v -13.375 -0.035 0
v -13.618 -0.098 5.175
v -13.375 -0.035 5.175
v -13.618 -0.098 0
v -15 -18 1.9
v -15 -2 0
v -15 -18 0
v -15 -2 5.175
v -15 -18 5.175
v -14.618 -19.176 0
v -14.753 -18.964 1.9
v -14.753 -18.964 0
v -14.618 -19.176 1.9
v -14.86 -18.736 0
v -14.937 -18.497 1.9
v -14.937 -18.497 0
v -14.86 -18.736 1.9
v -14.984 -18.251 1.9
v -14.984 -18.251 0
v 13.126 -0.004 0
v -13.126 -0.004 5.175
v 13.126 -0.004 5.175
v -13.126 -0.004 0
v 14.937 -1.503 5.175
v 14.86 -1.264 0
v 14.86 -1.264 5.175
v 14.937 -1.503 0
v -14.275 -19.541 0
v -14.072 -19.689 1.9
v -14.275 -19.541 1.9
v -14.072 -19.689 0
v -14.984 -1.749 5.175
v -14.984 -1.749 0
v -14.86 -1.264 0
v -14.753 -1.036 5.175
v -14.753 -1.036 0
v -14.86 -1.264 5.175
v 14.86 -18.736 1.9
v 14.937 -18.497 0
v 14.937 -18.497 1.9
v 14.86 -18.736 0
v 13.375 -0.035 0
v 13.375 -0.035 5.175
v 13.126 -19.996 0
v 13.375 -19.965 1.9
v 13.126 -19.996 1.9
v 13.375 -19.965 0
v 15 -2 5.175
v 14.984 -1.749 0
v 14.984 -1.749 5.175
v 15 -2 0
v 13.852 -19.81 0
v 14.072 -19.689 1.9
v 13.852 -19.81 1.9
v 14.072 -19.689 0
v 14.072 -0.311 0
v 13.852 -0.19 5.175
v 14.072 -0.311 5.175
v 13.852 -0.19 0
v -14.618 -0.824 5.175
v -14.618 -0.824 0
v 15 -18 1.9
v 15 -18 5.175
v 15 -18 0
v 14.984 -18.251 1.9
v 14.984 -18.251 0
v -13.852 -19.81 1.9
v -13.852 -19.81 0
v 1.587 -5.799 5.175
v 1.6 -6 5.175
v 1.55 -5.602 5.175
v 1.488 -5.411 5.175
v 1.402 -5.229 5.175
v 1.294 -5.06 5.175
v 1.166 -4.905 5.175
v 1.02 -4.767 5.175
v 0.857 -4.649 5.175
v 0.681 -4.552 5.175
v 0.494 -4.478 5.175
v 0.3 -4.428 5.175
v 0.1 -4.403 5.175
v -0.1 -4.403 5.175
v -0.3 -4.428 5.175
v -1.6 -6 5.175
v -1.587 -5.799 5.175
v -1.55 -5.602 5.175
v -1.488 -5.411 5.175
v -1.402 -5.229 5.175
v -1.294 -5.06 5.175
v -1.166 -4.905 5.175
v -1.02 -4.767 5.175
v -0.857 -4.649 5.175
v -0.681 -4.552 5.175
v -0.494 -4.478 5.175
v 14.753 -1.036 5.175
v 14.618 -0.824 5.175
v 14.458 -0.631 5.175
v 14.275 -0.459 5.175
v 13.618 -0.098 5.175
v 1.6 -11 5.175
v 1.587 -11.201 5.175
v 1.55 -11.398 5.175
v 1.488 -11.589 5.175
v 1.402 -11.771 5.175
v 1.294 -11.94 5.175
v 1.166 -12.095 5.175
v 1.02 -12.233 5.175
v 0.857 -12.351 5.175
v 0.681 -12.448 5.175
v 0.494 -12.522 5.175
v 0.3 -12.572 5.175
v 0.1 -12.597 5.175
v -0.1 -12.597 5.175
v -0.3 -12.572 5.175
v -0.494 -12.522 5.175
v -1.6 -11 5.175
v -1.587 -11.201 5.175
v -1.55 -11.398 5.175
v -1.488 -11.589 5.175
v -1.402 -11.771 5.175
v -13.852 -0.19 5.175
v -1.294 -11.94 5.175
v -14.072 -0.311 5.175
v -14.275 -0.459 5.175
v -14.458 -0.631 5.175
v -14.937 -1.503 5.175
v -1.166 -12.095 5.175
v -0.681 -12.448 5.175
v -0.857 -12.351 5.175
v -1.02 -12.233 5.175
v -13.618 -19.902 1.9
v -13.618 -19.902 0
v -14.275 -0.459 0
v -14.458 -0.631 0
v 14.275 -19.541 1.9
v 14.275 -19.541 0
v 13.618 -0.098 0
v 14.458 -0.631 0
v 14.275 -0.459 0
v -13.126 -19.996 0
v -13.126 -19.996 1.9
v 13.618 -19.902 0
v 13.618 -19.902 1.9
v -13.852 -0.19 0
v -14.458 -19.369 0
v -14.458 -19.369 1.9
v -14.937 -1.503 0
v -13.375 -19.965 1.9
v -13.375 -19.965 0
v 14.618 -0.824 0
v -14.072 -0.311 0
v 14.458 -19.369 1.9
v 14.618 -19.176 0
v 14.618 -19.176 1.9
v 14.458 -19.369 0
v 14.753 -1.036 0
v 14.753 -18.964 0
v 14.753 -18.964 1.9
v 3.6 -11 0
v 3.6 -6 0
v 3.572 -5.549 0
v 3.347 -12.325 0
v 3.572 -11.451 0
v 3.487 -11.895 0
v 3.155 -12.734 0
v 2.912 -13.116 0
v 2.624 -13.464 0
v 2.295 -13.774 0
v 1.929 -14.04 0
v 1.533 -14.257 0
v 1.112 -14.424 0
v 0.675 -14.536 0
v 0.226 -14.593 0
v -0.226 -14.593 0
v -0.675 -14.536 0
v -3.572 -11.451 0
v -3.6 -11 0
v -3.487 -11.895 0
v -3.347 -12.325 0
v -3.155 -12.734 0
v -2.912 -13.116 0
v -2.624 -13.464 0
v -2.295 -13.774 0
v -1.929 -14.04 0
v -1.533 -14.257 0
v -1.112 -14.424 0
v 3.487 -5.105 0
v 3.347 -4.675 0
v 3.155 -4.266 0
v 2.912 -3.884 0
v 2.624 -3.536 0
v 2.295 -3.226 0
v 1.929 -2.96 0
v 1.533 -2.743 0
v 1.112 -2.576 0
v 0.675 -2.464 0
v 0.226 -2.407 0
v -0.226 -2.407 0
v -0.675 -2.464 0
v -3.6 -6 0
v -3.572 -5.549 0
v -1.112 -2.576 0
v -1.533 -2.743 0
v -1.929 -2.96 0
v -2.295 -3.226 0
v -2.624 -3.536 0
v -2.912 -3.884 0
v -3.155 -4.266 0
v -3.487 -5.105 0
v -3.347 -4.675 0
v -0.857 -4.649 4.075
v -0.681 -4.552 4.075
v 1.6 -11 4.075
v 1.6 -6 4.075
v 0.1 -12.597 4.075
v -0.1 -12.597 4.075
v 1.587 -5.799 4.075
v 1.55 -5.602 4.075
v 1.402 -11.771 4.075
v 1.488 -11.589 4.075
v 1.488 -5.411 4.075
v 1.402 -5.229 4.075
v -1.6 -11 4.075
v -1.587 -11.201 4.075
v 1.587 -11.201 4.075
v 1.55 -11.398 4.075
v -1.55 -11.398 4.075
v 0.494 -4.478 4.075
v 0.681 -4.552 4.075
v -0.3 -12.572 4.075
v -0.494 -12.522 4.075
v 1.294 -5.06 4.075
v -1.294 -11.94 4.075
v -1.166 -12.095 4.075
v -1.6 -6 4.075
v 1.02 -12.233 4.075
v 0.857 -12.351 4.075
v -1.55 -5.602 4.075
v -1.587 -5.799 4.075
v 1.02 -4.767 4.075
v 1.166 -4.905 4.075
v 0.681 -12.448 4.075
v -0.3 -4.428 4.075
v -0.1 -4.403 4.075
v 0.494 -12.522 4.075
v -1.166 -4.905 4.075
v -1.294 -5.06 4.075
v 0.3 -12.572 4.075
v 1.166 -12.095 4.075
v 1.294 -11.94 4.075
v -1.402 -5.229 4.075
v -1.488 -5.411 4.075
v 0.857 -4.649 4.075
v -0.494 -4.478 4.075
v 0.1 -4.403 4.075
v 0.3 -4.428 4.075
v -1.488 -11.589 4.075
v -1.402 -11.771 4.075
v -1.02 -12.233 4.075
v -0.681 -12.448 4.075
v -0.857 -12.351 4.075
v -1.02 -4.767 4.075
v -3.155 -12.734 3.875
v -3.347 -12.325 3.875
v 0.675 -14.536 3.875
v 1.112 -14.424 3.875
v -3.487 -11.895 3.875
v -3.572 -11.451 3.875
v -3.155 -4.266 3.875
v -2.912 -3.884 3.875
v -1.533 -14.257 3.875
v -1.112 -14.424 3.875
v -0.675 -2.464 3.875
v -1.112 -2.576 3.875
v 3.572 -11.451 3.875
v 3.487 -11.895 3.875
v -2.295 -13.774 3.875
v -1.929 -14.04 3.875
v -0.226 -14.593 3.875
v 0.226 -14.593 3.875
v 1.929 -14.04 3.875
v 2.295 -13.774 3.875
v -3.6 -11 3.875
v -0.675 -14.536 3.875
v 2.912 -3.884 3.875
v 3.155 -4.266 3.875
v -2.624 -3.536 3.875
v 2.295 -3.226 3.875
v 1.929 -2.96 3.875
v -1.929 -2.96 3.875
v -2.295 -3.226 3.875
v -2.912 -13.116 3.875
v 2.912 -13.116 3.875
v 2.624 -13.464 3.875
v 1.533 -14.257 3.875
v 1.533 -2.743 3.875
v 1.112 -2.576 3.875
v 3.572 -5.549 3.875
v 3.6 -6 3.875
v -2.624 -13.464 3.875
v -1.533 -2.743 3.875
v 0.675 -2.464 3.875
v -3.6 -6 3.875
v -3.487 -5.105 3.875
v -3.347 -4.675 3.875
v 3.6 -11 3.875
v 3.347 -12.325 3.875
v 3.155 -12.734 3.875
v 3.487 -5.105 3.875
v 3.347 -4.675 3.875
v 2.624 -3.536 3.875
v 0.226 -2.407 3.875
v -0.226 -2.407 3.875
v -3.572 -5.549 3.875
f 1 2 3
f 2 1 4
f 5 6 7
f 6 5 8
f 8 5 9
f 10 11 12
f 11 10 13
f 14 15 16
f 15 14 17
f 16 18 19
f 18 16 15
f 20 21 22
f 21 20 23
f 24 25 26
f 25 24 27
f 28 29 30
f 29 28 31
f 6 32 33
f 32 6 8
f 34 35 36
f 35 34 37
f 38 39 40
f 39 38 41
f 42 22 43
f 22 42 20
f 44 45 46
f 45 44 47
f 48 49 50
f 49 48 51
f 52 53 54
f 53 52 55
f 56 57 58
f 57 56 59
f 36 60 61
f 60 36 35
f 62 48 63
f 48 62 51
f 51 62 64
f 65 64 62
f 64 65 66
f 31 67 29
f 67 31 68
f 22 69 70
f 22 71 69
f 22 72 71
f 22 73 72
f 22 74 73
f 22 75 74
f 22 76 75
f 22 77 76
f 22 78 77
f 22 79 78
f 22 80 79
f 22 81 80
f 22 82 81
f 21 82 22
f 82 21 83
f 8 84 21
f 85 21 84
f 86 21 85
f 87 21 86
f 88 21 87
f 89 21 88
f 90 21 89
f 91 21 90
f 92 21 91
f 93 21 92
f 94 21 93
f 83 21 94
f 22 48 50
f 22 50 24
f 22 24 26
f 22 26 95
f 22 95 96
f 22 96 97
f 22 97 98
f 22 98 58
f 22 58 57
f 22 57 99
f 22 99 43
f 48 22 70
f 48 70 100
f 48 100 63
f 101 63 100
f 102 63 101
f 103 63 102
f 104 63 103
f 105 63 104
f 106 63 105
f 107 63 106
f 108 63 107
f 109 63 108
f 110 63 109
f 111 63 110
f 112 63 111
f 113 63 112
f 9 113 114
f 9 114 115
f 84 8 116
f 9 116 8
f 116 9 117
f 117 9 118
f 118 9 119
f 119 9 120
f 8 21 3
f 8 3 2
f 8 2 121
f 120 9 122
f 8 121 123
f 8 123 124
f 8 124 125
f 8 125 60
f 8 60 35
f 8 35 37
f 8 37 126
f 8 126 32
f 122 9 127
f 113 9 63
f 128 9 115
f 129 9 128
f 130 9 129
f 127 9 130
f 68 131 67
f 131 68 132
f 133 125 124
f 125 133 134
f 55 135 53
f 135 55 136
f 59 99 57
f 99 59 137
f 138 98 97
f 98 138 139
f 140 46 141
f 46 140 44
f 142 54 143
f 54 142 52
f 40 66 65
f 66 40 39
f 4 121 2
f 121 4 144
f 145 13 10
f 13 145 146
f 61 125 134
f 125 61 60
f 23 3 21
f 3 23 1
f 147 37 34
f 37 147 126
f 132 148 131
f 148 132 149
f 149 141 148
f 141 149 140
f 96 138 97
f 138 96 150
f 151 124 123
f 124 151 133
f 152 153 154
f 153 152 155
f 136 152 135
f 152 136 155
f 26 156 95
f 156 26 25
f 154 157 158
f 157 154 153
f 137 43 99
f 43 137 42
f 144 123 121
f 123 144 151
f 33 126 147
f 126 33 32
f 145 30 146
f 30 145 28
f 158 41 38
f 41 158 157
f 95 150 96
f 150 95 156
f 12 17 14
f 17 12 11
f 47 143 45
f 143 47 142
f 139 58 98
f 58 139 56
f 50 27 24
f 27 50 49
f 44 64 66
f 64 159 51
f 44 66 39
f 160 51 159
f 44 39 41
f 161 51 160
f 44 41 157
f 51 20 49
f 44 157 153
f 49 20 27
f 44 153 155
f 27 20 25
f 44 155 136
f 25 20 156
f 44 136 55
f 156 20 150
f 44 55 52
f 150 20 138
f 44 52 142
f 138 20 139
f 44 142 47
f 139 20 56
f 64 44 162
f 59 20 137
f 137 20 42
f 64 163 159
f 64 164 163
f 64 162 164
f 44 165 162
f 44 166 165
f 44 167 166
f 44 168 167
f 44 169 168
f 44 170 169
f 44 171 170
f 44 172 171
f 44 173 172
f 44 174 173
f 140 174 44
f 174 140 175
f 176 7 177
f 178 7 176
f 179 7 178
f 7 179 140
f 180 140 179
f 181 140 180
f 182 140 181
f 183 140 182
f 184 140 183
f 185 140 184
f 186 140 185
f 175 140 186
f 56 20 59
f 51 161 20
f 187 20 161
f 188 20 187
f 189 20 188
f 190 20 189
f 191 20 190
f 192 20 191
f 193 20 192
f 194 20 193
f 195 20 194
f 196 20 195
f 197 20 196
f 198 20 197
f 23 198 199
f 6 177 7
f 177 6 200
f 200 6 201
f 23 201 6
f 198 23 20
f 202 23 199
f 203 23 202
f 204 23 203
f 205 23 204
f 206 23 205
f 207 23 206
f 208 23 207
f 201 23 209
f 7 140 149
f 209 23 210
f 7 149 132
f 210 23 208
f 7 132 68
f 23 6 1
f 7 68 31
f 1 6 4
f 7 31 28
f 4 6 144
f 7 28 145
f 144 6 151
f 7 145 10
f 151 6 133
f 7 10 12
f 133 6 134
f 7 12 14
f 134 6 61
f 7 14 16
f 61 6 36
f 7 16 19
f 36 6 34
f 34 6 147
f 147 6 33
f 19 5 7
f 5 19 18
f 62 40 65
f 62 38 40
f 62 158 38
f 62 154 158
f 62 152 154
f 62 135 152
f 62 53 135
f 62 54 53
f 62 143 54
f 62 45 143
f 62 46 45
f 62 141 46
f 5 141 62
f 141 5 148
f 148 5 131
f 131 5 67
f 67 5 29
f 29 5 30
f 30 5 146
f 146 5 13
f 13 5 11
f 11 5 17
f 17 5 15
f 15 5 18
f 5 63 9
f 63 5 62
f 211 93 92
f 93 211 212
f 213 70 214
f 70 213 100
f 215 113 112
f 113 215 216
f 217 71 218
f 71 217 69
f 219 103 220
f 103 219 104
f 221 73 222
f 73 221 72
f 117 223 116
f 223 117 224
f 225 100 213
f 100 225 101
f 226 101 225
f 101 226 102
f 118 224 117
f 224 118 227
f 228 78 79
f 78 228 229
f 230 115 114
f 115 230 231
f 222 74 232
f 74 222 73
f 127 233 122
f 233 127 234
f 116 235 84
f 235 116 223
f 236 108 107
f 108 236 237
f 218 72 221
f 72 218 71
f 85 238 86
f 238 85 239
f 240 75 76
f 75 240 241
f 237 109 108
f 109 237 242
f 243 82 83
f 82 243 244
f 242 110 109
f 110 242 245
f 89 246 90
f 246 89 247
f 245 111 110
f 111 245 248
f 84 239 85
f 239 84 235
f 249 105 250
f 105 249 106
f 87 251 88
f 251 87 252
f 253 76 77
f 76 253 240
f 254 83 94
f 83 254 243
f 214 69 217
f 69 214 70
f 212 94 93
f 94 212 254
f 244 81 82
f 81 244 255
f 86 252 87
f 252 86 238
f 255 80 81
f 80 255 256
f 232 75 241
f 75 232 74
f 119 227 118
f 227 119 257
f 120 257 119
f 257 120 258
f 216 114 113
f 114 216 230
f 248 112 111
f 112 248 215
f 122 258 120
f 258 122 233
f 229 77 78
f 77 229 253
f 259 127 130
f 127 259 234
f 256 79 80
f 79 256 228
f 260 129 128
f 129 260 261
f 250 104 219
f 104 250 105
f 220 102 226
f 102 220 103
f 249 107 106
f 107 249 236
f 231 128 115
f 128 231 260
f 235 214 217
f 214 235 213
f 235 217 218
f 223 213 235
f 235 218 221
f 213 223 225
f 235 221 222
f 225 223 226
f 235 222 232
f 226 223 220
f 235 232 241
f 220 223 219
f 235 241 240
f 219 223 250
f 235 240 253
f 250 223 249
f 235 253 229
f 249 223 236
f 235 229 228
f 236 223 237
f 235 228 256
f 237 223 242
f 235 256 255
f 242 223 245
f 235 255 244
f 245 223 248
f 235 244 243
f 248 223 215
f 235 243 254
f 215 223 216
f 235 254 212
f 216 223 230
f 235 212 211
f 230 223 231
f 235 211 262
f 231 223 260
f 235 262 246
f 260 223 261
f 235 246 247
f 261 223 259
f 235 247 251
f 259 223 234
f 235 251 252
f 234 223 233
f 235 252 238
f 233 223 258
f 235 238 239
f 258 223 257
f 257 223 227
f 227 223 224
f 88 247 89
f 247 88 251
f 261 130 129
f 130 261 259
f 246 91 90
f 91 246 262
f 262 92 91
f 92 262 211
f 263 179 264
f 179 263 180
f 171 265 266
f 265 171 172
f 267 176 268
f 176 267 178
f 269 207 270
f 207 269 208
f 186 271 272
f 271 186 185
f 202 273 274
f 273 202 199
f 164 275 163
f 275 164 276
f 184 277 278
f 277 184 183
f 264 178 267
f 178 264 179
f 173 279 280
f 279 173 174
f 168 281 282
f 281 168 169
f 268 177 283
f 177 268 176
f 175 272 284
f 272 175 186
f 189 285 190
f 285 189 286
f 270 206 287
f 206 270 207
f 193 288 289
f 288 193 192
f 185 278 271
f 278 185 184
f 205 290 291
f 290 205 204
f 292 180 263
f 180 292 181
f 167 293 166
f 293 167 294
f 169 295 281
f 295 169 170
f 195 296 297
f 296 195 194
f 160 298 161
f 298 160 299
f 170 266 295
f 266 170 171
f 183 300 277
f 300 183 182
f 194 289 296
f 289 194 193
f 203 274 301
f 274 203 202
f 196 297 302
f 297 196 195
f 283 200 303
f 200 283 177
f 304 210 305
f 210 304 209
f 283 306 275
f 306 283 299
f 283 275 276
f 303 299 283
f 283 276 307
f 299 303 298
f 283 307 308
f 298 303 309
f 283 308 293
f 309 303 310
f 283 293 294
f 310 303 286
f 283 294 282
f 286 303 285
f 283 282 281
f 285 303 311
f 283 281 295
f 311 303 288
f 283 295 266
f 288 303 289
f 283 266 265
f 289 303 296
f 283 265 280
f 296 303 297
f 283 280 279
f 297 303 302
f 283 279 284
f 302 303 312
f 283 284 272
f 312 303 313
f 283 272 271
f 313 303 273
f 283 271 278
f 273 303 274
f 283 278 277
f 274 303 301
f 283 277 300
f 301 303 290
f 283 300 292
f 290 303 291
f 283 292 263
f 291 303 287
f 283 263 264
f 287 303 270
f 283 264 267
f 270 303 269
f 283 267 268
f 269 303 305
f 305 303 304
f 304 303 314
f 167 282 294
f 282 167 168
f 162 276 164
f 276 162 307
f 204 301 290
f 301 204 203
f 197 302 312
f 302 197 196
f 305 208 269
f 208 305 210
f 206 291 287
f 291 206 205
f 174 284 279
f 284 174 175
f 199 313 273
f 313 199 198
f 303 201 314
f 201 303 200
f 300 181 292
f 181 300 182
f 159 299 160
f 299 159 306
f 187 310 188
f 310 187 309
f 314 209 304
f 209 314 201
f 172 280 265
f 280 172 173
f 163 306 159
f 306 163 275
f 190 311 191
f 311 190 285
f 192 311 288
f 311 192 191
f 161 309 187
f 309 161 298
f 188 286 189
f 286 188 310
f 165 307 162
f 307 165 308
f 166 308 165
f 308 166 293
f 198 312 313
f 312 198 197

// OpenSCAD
$fn=50;

oneEighthIn=3.175; // 1/8" to mm

if (1) translate([0,0,oneEighthIn+2]) rotate([180,0,0]) difference() {
   formBeveled();
   translate([0,6,0]) boltCutout(gap=1);
}

module formBeveled() {
   translate([-15,0,0]) difference() {
      hull() {
         translate([2,2,0]) cylinder(r=2,h=2+oneEighthIn);
         translate([28,2,0]) cylinder(r=2,h=2+oneEighthIn);
         translate([2,18,0]) cylinder(r=2,h=2+oneEighthIn);
         translate([28,18,0]) cylinder(r=2,h=2+oneEighthIn);
      }
      translate([0,18,-0.1]) cube([30,2,oneEighthIn+0.2]);
   }
}
   
module form() {
   translate([-15,0,0]) cube([30,18,oneEighthIn+0.1]);
   translate([-15,0,oneEighthIn]) cube([30,20,2]);
}


module boltCutout(thick=1.2,gap=0,washer=7.2) {
   translate([0,0,-0.1]) {
      hull() {
         cylinder(d=3.2,h=thick);
         translate([0,5,0]) cylinder(d=3.2,h=thick);
      }
   
      translate([0,0,thick+0.2*gap]) hull() {
         cylinder(d=washer,h=10);
         translate([0,5,0]) cylinder(d=washer,h=10);
      }
   }
}
